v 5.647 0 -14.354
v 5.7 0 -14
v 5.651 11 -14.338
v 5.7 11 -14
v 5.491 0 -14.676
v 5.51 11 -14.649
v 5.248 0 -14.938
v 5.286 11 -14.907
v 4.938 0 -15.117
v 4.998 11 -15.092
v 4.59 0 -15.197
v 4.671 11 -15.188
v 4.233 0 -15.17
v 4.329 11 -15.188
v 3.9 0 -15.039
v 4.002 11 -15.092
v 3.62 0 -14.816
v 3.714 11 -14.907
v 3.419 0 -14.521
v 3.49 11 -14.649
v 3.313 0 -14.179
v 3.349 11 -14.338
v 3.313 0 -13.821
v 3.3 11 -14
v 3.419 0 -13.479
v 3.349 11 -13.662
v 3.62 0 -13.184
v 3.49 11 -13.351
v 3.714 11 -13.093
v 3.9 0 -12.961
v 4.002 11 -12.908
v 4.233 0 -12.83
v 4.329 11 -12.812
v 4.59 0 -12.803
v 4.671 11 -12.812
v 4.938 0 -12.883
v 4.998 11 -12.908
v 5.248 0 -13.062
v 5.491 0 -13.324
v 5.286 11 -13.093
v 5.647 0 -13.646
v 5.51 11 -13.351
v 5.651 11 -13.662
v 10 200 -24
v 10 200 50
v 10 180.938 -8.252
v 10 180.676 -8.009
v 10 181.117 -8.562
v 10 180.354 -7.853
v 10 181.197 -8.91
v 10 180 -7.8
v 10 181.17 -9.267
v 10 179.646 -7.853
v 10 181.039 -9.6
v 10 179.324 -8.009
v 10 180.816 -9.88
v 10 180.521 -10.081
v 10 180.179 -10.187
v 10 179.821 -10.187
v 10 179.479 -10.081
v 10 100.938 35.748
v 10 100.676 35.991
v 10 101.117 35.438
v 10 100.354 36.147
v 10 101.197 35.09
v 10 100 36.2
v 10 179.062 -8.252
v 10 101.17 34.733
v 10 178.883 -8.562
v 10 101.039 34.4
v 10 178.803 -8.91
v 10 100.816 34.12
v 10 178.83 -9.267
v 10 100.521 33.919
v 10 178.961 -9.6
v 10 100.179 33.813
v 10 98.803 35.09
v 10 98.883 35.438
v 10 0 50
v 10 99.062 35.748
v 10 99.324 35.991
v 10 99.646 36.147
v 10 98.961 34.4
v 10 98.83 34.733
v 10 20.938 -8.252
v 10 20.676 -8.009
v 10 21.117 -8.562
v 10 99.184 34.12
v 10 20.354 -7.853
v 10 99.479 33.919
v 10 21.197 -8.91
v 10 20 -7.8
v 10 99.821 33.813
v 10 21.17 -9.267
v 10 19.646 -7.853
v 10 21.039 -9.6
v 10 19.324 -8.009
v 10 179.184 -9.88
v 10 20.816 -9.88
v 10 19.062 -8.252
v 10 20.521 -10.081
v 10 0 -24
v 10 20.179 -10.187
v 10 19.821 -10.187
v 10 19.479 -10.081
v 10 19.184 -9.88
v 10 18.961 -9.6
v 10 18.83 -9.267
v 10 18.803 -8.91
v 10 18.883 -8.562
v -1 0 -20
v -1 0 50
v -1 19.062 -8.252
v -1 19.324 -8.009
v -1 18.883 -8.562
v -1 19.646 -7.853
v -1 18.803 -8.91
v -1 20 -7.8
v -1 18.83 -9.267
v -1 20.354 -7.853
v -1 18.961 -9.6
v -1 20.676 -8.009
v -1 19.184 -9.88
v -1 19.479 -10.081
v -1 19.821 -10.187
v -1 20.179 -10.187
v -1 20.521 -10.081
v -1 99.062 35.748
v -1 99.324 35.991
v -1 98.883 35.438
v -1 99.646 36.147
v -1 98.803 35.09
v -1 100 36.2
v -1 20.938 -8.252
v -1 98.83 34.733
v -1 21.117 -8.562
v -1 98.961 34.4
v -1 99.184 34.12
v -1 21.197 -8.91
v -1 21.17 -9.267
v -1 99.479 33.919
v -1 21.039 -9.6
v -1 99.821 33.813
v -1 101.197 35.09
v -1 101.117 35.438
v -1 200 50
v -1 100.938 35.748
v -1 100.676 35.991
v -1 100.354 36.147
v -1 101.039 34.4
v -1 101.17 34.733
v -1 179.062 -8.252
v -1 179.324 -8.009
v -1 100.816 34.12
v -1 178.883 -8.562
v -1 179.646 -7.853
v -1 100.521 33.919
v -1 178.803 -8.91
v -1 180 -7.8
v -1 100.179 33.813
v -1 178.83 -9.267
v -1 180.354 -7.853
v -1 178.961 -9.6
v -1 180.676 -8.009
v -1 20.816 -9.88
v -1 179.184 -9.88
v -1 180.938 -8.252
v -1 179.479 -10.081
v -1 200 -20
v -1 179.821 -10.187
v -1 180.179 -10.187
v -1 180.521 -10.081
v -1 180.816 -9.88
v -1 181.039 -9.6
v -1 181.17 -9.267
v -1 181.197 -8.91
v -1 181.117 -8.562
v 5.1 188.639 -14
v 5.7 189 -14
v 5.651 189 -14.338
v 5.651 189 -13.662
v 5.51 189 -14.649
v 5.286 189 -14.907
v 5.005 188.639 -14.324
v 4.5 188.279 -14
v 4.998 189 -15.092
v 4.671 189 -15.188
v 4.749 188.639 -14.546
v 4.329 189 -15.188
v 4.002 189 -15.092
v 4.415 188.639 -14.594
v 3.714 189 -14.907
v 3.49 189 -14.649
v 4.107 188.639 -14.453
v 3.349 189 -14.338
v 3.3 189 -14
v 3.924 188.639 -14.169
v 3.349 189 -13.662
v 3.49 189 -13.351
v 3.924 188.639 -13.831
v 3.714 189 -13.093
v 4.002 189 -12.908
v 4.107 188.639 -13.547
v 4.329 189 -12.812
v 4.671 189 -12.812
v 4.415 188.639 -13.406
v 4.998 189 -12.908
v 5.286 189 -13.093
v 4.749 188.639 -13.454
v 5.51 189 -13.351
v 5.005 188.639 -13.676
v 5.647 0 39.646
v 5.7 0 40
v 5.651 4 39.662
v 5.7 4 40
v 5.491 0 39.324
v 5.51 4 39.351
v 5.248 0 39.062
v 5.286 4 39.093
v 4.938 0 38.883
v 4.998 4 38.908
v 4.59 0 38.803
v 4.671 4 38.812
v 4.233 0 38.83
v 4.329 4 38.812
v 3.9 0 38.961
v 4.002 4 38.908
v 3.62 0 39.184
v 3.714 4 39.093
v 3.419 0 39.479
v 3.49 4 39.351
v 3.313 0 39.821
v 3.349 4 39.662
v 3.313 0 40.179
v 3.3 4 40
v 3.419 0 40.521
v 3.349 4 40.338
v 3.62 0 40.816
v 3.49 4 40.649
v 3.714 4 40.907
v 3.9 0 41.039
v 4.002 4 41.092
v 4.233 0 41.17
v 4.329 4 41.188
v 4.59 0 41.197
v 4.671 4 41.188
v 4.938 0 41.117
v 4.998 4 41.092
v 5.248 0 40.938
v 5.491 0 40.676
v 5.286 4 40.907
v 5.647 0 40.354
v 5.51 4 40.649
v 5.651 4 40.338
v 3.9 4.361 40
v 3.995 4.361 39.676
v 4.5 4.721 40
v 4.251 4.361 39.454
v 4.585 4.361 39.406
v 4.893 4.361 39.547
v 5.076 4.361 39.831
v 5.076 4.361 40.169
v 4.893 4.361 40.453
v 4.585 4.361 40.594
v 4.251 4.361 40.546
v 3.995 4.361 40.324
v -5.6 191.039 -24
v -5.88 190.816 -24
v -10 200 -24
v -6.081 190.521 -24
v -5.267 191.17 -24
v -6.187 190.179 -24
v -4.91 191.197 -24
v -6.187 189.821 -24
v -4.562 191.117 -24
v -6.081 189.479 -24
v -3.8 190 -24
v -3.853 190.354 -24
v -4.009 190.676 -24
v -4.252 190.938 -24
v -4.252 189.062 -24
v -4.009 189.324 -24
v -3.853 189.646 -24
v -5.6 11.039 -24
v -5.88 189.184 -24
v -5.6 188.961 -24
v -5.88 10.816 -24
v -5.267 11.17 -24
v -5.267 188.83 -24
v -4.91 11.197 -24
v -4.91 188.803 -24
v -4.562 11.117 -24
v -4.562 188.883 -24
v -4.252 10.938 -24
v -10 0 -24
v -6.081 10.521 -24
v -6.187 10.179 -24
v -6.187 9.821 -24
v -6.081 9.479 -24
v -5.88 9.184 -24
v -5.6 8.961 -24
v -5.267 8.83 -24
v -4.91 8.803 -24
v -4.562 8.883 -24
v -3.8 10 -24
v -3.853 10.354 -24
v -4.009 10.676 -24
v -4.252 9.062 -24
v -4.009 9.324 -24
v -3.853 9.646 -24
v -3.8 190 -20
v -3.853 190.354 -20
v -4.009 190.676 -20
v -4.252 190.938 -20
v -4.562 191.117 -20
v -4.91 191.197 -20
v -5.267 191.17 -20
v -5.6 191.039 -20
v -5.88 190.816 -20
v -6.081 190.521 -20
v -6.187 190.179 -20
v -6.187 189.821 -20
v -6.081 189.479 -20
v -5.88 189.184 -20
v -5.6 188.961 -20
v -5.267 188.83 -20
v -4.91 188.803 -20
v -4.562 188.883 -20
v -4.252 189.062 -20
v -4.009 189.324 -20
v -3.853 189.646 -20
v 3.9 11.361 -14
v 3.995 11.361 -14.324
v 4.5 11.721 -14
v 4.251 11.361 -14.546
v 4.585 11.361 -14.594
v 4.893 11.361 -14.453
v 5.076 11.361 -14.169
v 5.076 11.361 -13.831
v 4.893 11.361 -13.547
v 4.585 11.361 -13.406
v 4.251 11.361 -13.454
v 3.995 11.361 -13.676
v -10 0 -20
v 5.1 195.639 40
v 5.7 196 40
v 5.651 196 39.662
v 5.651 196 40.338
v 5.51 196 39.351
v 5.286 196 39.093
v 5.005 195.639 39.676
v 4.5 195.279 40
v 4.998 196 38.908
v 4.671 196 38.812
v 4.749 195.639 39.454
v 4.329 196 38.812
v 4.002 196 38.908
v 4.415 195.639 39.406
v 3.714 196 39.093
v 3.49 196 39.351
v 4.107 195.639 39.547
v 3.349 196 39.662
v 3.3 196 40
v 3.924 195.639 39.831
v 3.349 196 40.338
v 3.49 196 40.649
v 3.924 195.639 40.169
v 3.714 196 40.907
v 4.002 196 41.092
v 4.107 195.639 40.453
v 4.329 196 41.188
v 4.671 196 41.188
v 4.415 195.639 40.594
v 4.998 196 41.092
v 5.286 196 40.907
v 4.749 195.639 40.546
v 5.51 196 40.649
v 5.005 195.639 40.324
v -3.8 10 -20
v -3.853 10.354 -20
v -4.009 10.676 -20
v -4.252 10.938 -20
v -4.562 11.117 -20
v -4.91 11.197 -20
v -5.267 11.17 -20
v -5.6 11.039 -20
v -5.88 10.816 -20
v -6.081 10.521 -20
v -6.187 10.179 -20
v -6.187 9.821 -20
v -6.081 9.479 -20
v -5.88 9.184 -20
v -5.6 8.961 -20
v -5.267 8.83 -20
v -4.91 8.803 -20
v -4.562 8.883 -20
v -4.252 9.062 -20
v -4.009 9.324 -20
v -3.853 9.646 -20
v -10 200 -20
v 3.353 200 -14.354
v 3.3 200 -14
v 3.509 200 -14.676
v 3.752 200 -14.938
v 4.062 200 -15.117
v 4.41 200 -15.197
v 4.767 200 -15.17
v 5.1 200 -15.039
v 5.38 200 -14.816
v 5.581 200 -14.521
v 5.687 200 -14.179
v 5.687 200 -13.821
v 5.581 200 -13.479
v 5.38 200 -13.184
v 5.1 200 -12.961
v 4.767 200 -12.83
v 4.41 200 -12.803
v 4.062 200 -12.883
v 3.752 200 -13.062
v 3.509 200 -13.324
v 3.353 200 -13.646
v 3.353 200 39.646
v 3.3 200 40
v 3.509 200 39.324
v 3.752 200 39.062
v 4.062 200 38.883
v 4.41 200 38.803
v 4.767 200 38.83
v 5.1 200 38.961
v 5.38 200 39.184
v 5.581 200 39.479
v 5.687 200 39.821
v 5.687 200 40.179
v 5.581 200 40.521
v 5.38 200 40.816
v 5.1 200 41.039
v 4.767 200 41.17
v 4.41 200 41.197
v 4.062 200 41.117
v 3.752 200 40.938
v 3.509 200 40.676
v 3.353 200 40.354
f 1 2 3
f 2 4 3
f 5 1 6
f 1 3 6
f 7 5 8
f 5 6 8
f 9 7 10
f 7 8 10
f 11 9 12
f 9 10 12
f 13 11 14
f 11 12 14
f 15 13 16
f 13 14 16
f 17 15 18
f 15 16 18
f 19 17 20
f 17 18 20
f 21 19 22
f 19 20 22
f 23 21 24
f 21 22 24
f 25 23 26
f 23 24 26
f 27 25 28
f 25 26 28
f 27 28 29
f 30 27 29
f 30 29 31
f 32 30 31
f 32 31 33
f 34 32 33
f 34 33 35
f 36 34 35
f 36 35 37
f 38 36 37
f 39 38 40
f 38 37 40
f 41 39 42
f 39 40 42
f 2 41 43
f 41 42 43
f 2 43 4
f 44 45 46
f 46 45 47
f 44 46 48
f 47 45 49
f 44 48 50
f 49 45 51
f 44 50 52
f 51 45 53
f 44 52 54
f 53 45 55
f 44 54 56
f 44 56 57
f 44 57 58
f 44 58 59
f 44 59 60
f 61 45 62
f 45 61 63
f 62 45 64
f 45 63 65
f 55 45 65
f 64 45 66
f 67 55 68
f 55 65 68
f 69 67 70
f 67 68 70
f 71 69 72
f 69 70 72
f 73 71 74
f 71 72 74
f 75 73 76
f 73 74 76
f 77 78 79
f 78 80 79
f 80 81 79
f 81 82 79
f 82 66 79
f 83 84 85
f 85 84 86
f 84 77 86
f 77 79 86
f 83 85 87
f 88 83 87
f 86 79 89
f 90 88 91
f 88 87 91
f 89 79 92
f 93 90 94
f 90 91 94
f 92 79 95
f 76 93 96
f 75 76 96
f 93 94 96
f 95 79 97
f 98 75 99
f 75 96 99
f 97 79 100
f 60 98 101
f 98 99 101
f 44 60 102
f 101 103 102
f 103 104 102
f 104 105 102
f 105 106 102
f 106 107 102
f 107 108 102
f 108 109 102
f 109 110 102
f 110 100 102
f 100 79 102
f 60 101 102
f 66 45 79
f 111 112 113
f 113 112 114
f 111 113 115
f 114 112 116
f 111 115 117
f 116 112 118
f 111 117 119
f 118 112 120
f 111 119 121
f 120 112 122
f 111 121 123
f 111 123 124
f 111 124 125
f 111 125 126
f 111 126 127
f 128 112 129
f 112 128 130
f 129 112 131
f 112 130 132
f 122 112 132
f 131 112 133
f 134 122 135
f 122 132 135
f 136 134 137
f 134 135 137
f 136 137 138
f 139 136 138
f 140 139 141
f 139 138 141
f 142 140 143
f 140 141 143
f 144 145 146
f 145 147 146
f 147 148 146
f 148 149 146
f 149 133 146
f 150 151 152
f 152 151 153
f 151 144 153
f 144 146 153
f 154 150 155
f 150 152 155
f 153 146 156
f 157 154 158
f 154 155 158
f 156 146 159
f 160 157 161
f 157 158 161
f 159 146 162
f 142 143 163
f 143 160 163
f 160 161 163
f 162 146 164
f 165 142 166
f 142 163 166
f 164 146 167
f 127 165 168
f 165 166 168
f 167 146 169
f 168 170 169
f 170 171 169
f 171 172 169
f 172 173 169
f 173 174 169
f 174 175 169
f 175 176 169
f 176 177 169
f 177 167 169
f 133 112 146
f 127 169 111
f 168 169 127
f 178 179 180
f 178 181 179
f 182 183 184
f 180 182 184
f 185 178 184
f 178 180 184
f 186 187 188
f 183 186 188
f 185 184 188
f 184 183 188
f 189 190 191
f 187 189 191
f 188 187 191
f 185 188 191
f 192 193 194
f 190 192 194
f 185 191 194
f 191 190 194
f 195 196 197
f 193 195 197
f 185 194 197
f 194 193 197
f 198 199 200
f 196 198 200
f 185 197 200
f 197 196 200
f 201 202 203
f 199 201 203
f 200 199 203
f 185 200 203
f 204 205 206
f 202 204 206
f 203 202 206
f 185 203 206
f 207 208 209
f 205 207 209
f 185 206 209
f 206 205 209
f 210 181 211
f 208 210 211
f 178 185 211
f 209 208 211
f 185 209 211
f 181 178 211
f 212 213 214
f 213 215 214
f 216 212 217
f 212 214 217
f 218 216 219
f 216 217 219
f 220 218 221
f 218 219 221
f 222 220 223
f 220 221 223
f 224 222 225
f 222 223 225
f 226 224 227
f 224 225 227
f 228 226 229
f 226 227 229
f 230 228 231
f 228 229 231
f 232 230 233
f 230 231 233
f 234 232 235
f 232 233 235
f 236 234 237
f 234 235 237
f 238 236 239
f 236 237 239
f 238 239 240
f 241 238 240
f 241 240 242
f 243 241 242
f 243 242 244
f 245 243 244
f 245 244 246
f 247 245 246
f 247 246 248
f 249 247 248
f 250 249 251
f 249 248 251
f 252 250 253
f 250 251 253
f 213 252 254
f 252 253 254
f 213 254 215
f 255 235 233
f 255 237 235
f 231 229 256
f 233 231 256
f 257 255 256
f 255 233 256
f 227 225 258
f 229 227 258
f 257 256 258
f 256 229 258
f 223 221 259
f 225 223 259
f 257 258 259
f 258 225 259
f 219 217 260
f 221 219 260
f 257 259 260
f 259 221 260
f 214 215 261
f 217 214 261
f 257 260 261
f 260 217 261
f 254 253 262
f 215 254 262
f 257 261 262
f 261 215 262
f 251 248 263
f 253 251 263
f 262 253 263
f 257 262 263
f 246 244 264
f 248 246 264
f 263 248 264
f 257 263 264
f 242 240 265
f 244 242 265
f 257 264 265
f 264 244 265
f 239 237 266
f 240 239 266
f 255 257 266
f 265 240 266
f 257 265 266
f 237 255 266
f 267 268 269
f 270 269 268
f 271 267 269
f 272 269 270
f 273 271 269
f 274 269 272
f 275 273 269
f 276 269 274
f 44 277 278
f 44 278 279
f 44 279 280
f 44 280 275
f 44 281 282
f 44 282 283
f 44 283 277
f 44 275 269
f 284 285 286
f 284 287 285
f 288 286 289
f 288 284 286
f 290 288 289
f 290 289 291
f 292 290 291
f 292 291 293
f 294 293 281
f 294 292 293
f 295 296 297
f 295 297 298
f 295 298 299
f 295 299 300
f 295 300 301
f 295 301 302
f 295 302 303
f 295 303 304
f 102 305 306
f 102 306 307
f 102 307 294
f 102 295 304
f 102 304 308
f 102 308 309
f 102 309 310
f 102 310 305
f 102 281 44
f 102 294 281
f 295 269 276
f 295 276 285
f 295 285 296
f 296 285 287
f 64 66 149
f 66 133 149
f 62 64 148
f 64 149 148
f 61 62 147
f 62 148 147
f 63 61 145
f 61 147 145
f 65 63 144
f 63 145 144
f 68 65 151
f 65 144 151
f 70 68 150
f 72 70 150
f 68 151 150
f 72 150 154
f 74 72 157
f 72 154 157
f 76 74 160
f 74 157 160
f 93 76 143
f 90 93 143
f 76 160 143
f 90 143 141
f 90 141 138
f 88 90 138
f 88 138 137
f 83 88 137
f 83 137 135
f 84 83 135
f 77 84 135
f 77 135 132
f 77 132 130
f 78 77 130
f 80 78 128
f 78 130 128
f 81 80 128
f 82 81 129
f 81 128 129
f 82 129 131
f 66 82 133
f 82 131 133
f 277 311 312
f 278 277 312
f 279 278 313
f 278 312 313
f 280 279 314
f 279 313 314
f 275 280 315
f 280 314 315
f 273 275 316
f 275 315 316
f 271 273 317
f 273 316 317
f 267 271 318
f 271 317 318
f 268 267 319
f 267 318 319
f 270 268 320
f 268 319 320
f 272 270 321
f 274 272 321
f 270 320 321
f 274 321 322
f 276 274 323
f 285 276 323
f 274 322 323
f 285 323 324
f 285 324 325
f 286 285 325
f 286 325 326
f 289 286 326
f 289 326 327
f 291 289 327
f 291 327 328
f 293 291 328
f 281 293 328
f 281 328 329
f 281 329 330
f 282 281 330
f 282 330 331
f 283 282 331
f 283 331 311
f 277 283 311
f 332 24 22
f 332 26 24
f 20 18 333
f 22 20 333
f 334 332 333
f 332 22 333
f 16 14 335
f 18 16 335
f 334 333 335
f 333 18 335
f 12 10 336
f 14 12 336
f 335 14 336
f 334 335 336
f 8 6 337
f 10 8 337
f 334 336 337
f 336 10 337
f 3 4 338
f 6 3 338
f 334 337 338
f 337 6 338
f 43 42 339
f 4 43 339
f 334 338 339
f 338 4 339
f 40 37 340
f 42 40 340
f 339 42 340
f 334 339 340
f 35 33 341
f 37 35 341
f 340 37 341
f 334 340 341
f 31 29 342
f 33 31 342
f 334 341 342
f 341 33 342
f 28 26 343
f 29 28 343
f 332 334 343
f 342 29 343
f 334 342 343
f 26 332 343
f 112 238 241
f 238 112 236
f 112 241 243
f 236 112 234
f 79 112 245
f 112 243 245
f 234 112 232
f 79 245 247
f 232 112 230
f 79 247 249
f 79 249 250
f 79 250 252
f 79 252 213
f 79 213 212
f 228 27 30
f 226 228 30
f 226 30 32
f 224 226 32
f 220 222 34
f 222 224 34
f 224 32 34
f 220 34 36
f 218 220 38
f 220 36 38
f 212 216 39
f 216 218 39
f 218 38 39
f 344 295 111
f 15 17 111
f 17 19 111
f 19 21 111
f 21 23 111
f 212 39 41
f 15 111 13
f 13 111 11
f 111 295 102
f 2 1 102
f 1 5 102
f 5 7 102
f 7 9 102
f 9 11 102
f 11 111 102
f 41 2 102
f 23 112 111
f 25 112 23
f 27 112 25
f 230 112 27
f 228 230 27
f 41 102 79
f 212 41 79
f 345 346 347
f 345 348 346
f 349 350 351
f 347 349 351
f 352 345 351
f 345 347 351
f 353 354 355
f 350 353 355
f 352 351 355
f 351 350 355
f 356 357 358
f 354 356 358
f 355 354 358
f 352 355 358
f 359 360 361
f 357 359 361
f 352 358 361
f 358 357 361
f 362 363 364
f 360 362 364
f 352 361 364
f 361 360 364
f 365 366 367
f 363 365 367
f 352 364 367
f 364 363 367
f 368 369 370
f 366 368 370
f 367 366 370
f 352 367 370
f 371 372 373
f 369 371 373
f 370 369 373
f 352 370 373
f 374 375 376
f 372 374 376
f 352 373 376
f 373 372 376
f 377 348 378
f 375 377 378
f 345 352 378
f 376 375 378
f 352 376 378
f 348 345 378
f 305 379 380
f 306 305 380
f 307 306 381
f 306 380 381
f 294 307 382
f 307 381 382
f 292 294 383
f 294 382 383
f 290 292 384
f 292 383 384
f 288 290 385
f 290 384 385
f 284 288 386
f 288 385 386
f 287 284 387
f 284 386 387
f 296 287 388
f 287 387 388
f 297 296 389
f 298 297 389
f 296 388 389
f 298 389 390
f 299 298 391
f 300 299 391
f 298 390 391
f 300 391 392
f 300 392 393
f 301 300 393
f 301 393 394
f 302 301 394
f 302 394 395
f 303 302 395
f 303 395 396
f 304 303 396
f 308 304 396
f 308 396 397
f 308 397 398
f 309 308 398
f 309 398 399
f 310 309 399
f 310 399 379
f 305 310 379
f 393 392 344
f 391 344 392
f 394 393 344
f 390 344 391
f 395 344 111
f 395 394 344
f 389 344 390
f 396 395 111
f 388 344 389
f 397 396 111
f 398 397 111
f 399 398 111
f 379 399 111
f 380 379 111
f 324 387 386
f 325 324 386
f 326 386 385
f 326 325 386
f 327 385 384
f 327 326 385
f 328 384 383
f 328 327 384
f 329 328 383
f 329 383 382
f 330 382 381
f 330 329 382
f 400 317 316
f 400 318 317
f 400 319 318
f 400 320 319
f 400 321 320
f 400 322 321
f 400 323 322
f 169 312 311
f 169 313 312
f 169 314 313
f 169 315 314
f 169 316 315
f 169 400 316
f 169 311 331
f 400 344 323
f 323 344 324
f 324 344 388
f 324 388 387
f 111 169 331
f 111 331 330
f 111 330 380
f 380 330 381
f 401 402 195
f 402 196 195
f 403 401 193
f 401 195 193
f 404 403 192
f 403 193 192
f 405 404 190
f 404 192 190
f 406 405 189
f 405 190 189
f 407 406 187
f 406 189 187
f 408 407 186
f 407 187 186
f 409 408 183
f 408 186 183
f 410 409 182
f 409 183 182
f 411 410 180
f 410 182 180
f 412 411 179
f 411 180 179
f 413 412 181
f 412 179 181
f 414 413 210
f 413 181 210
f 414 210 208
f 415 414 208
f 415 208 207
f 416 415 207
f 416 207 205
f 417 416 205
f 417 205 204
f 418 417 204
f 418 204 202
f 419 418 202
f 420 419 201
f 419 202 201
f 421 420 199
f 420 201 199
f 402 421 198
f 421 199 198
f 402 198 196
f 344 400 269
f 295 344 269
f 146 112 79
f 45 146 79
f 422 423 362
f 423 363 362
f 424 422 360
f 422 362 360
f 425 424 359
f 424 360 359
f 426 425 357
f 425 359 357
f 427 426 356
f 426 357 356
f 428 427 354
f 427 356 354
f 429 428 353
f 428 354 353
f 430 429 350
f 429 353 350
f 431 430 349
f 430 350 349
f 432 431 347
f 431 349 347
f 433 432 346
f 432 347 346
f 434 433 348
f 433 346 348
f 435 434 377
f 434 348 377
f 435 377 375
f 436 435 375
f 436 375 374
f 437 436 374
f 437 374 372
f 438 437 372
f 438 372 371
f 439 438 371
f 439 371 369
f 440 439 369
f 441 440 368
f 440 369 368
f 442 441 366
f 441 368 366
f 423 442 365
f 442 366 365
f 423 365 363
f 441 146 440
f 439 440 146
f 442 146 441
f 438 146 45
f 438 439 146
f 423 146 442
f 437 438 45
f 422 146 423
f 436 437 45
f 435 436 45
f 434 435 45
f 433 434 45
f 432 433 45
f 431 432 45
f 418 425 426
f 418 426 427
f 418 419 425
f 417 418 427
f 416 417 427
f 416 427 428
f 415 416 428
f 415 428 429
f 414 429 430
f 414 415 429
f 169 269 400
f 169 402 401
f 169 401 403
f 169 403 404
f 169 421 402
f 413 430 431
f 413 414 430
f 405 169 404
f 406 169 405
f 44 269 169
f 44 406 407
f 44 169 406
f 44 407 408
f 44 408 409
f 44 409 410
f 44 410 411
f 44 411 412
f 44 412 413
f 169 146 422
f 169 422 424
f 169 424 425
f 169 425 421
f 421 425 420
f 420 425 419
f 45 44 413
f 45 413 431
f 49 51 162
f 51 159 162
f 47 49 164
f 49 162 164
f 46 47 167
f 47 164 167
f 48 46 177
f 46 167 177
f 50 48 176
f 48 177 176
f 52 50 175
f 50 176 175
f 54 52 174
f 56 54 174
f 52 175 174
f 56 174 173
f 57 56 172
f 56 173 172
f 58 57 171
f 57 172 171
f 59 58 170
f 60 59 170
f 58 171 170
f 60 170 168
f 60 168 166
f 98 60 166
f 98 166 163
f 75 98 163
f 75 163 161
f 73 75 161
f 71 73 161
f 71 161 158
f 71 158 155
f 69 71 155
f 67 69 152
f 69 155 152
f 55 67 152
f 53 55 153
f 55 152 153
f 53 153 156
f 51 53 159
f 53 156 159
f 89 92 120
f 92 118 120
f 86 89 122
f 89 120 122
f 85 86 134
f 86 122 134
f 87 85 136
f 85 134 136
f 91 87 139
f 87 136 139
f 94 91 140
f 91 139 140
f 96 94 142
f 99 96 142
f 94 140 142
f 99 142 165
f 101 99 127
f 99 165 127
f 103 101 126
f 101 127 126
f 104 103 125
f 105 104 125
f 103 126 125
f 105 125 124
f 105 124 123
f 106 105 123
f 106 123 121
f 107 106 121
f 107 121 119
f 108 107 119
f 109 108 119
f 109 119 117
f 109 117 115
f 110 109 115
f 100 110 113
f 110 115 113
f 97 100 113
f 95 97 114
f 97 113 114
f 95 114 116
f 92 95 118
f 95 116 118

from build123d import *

# Parameters (mm, degrees)
SKETCH1_W                = 20
SKETCH1_H                = 100
BOSS_EXTRUDE1_DEPTH      = 200
SKETCH2_W                = 9
SKETCH2_H                = 70
CUT_EXTRUDE1_DEPTH       = 207.397674406
M2_CLEARANCE_HOLE1_D     = 2.4
M2_CLEARANCE_HOLE1_DEPTH = 4
M2_CLEARANCE_HOLE1_TIP   = 0.721032743
M2_CLEARANCE_HOLE2_D     = 2.4
M2_CLEARANCE_HOLE2_DEPTH = 4
M2_CLEARANCE_HOLE2_TIP   = 0.721032743
M2_CLEARANCE_HOLE4_D     = 2.4
SKETCH13_W               = 20
SKETCH13_H               = 26
CUT_EXTRUDE2_DEPTH       = 207.397674406
M2_CLEARANCE_HOLE5_D     = 2.4
M2_CLEARANCE_HOLE5_DEPTH = 11
M2_CLEARANCE_HOLE5_TIP   = 0.721032743
M2_CLEARANCE_HOLE6_D     = 2.4
M2_CLEARANCE_HOLE6_DEPTH = 11
M2_CLEARANCE_HOLE6_TIP   = 0.721032743
M2_CLEARANCE_HOLE7_D     = 2.4
M2_CLEARANCE_HOLE7_DEPTH = 11
M2_CLEARANCE_HOLE7_TIP   = 0.721032743


with BuildPart() as part:
    # Sketch1 → Boss-Extrude1 (new body)
    with BuildSketch(Plane(origin=(0, 0, 0), x_dir=(1, 0, 0), z_dir=(0, 1, 0))):
        Rectangle(SKETCH1_W, SKETCH1_H)
    extrude(amount=BOSS_EXTRUDE1_DEPTH)

    # Sketch2 → Cut-Extrude1 (cut, through all)
    with BuildSketch(Plane(origin=(0, 200, 0), x_dir=(1, 0, 0), z_dir=(0, 1, 0))):
        with Locations((-5.5, -15)):
            Rectangle(SKETCH2_W, SKETCH2_H)
    extrude(amount=-CUT_EXTRUDE1_DEPTH, mode=Mode.SUBTRACT)

    # M2 Clearance Hole1
    with Locations(Plane(origin=(0, 200, 0), x_dir=(1, 0, 0), z_dir=(0, 1, 0))):
        with Locations((4.5, 40), (4.5, -40)):
            Hole(M2_CLEARANCE_HOLE1_D / 2, depth=M2_CLEARANCE_HOLE1_DEPTH)
            with Locations((0, 0, -(M2_CLEARANCE_HOLE1_DEPTH + M2_CLEARANCE_HOLE1_TIP / 2))):  # 118° drill point
                Cone(0, M2_CLEARANCE_HOLE1_D / 2, M2_CLEARANCE_HOLE1_TIP, mode=Mode.SUBTRACT)

    # M2 Clearance Hole2
    with Locations(Plane(origin=(0, 0, 0), x_dir=(-1, 0, 0), z_dir=(0, -1, 0))):
        with Locations((-4.5, 40), (-4.5, -40)):
            Hole(M2_CLEARANCE_HOLE2_D / 2, depth=M2_CLEARANCE_HOLE2_DEPTH)
            with Locations((0, 0, -(M2_CLEARANCE_HOLE2_DEPTH + M2_CLEARANCE_HOLE2_TIP / 2))):  # 118° drill point
                Cone(0, M2_CLEARANCE_HOLE2_D / 2, M2_CLEARANCE_HOLE2_TIP, mode=Mode.SUBTRACT)

    # M2 Clearance Hole4 (through all)
    with Locations(Plane(origin=(0, 0, -50), x_dir=(-1, 0, 0), z_dir=(0, 0, -1))):
        with Locations((5, 190), (5, 10)):
            Hole(M2_CLEARANCE_HOLE4_D / 2)

    # Sketch13 → Cut-Extrude2 (cut, through all)
    with BuildSketch(Plane.XZ):
        with Locations((0, -37)):
            Rectangle(SKETCH13_W, SKETCH13_H)
    extrude(amount=-CUT_EXTRUDE2_DEPTH, mode=Mode.SUBTRACT)

    # M2 Clearance Hole5
    with Locations(Plane(origin=(0, 0, 0), x_dir=(-1, 0, 0), z_dir=(0, -1, 0))):
        with Locations((-4.5, 14)):
            Hole(M2_CLEARANCE_HOLE5_D / 2, depth=M2_CLEARANCE_HOLE5_DEPTH)
            with Locations((0, 0, -(M2_CLEARANCE_HOLE5_DEPTH + M2_CLEARANCE_HOLE5_TIP / 2))):  # 118° drill point
                Cone(0, M2_CLEARANCE_HOLE5_D / 2, M2_CLEARANCE_HOLE5_TIP, mode=Mode.SUBTRACT)

    # M2 Clearance Hole6
    with Locations(Plane(origin=(0, 200, 0), x_dir=(1, 0, 0), z_dir=(0, 1, 0))):
        with Locations((4.5, 14)):
            Hole(M2_CLEARANCE_HOLE6_D / 2, depth=M2_CLEARANCE_HOLE6_DEPTH)
            with Locations((0, 0, -(M2_CLEARANCE_HOLE6_DEPTH + M2_CLEARANCE_HOLE6_TIP / 2))):  # 118° drill point
                Cone(0, M2_CLEARANCE_HOLE6_D / 2, M2_CLEARANCE_HOLE6_TIP, mode=Mode.SUBTRACT)

    # M2 Clearance Hole7
    with Locations(Plane(origin=(10, 0, 0), x_dir=(0, 0, -1), z_dir=(1, 0, 0))):
        with Locations((9, 20), (9, 180), (-35, 100)):
            Hole(M2_CLEARANCE_HOLE7_D / 2, depth=M2_CLEARANCE_HOLE7_DEPTH)
            with Locations((0, 0, -(M2_CLEARANCE_HOLE7_DEPTH + M2_CLEARANCE_HOLE7_TIP / 2))):  # 118° drill point
                Cone(0, M2_CLEARANCE_HOLE7_D / 2, M2_CLEARANCE_HOLE7_TIP, mode=Mode.SUBTRACT)


solid = part.part
